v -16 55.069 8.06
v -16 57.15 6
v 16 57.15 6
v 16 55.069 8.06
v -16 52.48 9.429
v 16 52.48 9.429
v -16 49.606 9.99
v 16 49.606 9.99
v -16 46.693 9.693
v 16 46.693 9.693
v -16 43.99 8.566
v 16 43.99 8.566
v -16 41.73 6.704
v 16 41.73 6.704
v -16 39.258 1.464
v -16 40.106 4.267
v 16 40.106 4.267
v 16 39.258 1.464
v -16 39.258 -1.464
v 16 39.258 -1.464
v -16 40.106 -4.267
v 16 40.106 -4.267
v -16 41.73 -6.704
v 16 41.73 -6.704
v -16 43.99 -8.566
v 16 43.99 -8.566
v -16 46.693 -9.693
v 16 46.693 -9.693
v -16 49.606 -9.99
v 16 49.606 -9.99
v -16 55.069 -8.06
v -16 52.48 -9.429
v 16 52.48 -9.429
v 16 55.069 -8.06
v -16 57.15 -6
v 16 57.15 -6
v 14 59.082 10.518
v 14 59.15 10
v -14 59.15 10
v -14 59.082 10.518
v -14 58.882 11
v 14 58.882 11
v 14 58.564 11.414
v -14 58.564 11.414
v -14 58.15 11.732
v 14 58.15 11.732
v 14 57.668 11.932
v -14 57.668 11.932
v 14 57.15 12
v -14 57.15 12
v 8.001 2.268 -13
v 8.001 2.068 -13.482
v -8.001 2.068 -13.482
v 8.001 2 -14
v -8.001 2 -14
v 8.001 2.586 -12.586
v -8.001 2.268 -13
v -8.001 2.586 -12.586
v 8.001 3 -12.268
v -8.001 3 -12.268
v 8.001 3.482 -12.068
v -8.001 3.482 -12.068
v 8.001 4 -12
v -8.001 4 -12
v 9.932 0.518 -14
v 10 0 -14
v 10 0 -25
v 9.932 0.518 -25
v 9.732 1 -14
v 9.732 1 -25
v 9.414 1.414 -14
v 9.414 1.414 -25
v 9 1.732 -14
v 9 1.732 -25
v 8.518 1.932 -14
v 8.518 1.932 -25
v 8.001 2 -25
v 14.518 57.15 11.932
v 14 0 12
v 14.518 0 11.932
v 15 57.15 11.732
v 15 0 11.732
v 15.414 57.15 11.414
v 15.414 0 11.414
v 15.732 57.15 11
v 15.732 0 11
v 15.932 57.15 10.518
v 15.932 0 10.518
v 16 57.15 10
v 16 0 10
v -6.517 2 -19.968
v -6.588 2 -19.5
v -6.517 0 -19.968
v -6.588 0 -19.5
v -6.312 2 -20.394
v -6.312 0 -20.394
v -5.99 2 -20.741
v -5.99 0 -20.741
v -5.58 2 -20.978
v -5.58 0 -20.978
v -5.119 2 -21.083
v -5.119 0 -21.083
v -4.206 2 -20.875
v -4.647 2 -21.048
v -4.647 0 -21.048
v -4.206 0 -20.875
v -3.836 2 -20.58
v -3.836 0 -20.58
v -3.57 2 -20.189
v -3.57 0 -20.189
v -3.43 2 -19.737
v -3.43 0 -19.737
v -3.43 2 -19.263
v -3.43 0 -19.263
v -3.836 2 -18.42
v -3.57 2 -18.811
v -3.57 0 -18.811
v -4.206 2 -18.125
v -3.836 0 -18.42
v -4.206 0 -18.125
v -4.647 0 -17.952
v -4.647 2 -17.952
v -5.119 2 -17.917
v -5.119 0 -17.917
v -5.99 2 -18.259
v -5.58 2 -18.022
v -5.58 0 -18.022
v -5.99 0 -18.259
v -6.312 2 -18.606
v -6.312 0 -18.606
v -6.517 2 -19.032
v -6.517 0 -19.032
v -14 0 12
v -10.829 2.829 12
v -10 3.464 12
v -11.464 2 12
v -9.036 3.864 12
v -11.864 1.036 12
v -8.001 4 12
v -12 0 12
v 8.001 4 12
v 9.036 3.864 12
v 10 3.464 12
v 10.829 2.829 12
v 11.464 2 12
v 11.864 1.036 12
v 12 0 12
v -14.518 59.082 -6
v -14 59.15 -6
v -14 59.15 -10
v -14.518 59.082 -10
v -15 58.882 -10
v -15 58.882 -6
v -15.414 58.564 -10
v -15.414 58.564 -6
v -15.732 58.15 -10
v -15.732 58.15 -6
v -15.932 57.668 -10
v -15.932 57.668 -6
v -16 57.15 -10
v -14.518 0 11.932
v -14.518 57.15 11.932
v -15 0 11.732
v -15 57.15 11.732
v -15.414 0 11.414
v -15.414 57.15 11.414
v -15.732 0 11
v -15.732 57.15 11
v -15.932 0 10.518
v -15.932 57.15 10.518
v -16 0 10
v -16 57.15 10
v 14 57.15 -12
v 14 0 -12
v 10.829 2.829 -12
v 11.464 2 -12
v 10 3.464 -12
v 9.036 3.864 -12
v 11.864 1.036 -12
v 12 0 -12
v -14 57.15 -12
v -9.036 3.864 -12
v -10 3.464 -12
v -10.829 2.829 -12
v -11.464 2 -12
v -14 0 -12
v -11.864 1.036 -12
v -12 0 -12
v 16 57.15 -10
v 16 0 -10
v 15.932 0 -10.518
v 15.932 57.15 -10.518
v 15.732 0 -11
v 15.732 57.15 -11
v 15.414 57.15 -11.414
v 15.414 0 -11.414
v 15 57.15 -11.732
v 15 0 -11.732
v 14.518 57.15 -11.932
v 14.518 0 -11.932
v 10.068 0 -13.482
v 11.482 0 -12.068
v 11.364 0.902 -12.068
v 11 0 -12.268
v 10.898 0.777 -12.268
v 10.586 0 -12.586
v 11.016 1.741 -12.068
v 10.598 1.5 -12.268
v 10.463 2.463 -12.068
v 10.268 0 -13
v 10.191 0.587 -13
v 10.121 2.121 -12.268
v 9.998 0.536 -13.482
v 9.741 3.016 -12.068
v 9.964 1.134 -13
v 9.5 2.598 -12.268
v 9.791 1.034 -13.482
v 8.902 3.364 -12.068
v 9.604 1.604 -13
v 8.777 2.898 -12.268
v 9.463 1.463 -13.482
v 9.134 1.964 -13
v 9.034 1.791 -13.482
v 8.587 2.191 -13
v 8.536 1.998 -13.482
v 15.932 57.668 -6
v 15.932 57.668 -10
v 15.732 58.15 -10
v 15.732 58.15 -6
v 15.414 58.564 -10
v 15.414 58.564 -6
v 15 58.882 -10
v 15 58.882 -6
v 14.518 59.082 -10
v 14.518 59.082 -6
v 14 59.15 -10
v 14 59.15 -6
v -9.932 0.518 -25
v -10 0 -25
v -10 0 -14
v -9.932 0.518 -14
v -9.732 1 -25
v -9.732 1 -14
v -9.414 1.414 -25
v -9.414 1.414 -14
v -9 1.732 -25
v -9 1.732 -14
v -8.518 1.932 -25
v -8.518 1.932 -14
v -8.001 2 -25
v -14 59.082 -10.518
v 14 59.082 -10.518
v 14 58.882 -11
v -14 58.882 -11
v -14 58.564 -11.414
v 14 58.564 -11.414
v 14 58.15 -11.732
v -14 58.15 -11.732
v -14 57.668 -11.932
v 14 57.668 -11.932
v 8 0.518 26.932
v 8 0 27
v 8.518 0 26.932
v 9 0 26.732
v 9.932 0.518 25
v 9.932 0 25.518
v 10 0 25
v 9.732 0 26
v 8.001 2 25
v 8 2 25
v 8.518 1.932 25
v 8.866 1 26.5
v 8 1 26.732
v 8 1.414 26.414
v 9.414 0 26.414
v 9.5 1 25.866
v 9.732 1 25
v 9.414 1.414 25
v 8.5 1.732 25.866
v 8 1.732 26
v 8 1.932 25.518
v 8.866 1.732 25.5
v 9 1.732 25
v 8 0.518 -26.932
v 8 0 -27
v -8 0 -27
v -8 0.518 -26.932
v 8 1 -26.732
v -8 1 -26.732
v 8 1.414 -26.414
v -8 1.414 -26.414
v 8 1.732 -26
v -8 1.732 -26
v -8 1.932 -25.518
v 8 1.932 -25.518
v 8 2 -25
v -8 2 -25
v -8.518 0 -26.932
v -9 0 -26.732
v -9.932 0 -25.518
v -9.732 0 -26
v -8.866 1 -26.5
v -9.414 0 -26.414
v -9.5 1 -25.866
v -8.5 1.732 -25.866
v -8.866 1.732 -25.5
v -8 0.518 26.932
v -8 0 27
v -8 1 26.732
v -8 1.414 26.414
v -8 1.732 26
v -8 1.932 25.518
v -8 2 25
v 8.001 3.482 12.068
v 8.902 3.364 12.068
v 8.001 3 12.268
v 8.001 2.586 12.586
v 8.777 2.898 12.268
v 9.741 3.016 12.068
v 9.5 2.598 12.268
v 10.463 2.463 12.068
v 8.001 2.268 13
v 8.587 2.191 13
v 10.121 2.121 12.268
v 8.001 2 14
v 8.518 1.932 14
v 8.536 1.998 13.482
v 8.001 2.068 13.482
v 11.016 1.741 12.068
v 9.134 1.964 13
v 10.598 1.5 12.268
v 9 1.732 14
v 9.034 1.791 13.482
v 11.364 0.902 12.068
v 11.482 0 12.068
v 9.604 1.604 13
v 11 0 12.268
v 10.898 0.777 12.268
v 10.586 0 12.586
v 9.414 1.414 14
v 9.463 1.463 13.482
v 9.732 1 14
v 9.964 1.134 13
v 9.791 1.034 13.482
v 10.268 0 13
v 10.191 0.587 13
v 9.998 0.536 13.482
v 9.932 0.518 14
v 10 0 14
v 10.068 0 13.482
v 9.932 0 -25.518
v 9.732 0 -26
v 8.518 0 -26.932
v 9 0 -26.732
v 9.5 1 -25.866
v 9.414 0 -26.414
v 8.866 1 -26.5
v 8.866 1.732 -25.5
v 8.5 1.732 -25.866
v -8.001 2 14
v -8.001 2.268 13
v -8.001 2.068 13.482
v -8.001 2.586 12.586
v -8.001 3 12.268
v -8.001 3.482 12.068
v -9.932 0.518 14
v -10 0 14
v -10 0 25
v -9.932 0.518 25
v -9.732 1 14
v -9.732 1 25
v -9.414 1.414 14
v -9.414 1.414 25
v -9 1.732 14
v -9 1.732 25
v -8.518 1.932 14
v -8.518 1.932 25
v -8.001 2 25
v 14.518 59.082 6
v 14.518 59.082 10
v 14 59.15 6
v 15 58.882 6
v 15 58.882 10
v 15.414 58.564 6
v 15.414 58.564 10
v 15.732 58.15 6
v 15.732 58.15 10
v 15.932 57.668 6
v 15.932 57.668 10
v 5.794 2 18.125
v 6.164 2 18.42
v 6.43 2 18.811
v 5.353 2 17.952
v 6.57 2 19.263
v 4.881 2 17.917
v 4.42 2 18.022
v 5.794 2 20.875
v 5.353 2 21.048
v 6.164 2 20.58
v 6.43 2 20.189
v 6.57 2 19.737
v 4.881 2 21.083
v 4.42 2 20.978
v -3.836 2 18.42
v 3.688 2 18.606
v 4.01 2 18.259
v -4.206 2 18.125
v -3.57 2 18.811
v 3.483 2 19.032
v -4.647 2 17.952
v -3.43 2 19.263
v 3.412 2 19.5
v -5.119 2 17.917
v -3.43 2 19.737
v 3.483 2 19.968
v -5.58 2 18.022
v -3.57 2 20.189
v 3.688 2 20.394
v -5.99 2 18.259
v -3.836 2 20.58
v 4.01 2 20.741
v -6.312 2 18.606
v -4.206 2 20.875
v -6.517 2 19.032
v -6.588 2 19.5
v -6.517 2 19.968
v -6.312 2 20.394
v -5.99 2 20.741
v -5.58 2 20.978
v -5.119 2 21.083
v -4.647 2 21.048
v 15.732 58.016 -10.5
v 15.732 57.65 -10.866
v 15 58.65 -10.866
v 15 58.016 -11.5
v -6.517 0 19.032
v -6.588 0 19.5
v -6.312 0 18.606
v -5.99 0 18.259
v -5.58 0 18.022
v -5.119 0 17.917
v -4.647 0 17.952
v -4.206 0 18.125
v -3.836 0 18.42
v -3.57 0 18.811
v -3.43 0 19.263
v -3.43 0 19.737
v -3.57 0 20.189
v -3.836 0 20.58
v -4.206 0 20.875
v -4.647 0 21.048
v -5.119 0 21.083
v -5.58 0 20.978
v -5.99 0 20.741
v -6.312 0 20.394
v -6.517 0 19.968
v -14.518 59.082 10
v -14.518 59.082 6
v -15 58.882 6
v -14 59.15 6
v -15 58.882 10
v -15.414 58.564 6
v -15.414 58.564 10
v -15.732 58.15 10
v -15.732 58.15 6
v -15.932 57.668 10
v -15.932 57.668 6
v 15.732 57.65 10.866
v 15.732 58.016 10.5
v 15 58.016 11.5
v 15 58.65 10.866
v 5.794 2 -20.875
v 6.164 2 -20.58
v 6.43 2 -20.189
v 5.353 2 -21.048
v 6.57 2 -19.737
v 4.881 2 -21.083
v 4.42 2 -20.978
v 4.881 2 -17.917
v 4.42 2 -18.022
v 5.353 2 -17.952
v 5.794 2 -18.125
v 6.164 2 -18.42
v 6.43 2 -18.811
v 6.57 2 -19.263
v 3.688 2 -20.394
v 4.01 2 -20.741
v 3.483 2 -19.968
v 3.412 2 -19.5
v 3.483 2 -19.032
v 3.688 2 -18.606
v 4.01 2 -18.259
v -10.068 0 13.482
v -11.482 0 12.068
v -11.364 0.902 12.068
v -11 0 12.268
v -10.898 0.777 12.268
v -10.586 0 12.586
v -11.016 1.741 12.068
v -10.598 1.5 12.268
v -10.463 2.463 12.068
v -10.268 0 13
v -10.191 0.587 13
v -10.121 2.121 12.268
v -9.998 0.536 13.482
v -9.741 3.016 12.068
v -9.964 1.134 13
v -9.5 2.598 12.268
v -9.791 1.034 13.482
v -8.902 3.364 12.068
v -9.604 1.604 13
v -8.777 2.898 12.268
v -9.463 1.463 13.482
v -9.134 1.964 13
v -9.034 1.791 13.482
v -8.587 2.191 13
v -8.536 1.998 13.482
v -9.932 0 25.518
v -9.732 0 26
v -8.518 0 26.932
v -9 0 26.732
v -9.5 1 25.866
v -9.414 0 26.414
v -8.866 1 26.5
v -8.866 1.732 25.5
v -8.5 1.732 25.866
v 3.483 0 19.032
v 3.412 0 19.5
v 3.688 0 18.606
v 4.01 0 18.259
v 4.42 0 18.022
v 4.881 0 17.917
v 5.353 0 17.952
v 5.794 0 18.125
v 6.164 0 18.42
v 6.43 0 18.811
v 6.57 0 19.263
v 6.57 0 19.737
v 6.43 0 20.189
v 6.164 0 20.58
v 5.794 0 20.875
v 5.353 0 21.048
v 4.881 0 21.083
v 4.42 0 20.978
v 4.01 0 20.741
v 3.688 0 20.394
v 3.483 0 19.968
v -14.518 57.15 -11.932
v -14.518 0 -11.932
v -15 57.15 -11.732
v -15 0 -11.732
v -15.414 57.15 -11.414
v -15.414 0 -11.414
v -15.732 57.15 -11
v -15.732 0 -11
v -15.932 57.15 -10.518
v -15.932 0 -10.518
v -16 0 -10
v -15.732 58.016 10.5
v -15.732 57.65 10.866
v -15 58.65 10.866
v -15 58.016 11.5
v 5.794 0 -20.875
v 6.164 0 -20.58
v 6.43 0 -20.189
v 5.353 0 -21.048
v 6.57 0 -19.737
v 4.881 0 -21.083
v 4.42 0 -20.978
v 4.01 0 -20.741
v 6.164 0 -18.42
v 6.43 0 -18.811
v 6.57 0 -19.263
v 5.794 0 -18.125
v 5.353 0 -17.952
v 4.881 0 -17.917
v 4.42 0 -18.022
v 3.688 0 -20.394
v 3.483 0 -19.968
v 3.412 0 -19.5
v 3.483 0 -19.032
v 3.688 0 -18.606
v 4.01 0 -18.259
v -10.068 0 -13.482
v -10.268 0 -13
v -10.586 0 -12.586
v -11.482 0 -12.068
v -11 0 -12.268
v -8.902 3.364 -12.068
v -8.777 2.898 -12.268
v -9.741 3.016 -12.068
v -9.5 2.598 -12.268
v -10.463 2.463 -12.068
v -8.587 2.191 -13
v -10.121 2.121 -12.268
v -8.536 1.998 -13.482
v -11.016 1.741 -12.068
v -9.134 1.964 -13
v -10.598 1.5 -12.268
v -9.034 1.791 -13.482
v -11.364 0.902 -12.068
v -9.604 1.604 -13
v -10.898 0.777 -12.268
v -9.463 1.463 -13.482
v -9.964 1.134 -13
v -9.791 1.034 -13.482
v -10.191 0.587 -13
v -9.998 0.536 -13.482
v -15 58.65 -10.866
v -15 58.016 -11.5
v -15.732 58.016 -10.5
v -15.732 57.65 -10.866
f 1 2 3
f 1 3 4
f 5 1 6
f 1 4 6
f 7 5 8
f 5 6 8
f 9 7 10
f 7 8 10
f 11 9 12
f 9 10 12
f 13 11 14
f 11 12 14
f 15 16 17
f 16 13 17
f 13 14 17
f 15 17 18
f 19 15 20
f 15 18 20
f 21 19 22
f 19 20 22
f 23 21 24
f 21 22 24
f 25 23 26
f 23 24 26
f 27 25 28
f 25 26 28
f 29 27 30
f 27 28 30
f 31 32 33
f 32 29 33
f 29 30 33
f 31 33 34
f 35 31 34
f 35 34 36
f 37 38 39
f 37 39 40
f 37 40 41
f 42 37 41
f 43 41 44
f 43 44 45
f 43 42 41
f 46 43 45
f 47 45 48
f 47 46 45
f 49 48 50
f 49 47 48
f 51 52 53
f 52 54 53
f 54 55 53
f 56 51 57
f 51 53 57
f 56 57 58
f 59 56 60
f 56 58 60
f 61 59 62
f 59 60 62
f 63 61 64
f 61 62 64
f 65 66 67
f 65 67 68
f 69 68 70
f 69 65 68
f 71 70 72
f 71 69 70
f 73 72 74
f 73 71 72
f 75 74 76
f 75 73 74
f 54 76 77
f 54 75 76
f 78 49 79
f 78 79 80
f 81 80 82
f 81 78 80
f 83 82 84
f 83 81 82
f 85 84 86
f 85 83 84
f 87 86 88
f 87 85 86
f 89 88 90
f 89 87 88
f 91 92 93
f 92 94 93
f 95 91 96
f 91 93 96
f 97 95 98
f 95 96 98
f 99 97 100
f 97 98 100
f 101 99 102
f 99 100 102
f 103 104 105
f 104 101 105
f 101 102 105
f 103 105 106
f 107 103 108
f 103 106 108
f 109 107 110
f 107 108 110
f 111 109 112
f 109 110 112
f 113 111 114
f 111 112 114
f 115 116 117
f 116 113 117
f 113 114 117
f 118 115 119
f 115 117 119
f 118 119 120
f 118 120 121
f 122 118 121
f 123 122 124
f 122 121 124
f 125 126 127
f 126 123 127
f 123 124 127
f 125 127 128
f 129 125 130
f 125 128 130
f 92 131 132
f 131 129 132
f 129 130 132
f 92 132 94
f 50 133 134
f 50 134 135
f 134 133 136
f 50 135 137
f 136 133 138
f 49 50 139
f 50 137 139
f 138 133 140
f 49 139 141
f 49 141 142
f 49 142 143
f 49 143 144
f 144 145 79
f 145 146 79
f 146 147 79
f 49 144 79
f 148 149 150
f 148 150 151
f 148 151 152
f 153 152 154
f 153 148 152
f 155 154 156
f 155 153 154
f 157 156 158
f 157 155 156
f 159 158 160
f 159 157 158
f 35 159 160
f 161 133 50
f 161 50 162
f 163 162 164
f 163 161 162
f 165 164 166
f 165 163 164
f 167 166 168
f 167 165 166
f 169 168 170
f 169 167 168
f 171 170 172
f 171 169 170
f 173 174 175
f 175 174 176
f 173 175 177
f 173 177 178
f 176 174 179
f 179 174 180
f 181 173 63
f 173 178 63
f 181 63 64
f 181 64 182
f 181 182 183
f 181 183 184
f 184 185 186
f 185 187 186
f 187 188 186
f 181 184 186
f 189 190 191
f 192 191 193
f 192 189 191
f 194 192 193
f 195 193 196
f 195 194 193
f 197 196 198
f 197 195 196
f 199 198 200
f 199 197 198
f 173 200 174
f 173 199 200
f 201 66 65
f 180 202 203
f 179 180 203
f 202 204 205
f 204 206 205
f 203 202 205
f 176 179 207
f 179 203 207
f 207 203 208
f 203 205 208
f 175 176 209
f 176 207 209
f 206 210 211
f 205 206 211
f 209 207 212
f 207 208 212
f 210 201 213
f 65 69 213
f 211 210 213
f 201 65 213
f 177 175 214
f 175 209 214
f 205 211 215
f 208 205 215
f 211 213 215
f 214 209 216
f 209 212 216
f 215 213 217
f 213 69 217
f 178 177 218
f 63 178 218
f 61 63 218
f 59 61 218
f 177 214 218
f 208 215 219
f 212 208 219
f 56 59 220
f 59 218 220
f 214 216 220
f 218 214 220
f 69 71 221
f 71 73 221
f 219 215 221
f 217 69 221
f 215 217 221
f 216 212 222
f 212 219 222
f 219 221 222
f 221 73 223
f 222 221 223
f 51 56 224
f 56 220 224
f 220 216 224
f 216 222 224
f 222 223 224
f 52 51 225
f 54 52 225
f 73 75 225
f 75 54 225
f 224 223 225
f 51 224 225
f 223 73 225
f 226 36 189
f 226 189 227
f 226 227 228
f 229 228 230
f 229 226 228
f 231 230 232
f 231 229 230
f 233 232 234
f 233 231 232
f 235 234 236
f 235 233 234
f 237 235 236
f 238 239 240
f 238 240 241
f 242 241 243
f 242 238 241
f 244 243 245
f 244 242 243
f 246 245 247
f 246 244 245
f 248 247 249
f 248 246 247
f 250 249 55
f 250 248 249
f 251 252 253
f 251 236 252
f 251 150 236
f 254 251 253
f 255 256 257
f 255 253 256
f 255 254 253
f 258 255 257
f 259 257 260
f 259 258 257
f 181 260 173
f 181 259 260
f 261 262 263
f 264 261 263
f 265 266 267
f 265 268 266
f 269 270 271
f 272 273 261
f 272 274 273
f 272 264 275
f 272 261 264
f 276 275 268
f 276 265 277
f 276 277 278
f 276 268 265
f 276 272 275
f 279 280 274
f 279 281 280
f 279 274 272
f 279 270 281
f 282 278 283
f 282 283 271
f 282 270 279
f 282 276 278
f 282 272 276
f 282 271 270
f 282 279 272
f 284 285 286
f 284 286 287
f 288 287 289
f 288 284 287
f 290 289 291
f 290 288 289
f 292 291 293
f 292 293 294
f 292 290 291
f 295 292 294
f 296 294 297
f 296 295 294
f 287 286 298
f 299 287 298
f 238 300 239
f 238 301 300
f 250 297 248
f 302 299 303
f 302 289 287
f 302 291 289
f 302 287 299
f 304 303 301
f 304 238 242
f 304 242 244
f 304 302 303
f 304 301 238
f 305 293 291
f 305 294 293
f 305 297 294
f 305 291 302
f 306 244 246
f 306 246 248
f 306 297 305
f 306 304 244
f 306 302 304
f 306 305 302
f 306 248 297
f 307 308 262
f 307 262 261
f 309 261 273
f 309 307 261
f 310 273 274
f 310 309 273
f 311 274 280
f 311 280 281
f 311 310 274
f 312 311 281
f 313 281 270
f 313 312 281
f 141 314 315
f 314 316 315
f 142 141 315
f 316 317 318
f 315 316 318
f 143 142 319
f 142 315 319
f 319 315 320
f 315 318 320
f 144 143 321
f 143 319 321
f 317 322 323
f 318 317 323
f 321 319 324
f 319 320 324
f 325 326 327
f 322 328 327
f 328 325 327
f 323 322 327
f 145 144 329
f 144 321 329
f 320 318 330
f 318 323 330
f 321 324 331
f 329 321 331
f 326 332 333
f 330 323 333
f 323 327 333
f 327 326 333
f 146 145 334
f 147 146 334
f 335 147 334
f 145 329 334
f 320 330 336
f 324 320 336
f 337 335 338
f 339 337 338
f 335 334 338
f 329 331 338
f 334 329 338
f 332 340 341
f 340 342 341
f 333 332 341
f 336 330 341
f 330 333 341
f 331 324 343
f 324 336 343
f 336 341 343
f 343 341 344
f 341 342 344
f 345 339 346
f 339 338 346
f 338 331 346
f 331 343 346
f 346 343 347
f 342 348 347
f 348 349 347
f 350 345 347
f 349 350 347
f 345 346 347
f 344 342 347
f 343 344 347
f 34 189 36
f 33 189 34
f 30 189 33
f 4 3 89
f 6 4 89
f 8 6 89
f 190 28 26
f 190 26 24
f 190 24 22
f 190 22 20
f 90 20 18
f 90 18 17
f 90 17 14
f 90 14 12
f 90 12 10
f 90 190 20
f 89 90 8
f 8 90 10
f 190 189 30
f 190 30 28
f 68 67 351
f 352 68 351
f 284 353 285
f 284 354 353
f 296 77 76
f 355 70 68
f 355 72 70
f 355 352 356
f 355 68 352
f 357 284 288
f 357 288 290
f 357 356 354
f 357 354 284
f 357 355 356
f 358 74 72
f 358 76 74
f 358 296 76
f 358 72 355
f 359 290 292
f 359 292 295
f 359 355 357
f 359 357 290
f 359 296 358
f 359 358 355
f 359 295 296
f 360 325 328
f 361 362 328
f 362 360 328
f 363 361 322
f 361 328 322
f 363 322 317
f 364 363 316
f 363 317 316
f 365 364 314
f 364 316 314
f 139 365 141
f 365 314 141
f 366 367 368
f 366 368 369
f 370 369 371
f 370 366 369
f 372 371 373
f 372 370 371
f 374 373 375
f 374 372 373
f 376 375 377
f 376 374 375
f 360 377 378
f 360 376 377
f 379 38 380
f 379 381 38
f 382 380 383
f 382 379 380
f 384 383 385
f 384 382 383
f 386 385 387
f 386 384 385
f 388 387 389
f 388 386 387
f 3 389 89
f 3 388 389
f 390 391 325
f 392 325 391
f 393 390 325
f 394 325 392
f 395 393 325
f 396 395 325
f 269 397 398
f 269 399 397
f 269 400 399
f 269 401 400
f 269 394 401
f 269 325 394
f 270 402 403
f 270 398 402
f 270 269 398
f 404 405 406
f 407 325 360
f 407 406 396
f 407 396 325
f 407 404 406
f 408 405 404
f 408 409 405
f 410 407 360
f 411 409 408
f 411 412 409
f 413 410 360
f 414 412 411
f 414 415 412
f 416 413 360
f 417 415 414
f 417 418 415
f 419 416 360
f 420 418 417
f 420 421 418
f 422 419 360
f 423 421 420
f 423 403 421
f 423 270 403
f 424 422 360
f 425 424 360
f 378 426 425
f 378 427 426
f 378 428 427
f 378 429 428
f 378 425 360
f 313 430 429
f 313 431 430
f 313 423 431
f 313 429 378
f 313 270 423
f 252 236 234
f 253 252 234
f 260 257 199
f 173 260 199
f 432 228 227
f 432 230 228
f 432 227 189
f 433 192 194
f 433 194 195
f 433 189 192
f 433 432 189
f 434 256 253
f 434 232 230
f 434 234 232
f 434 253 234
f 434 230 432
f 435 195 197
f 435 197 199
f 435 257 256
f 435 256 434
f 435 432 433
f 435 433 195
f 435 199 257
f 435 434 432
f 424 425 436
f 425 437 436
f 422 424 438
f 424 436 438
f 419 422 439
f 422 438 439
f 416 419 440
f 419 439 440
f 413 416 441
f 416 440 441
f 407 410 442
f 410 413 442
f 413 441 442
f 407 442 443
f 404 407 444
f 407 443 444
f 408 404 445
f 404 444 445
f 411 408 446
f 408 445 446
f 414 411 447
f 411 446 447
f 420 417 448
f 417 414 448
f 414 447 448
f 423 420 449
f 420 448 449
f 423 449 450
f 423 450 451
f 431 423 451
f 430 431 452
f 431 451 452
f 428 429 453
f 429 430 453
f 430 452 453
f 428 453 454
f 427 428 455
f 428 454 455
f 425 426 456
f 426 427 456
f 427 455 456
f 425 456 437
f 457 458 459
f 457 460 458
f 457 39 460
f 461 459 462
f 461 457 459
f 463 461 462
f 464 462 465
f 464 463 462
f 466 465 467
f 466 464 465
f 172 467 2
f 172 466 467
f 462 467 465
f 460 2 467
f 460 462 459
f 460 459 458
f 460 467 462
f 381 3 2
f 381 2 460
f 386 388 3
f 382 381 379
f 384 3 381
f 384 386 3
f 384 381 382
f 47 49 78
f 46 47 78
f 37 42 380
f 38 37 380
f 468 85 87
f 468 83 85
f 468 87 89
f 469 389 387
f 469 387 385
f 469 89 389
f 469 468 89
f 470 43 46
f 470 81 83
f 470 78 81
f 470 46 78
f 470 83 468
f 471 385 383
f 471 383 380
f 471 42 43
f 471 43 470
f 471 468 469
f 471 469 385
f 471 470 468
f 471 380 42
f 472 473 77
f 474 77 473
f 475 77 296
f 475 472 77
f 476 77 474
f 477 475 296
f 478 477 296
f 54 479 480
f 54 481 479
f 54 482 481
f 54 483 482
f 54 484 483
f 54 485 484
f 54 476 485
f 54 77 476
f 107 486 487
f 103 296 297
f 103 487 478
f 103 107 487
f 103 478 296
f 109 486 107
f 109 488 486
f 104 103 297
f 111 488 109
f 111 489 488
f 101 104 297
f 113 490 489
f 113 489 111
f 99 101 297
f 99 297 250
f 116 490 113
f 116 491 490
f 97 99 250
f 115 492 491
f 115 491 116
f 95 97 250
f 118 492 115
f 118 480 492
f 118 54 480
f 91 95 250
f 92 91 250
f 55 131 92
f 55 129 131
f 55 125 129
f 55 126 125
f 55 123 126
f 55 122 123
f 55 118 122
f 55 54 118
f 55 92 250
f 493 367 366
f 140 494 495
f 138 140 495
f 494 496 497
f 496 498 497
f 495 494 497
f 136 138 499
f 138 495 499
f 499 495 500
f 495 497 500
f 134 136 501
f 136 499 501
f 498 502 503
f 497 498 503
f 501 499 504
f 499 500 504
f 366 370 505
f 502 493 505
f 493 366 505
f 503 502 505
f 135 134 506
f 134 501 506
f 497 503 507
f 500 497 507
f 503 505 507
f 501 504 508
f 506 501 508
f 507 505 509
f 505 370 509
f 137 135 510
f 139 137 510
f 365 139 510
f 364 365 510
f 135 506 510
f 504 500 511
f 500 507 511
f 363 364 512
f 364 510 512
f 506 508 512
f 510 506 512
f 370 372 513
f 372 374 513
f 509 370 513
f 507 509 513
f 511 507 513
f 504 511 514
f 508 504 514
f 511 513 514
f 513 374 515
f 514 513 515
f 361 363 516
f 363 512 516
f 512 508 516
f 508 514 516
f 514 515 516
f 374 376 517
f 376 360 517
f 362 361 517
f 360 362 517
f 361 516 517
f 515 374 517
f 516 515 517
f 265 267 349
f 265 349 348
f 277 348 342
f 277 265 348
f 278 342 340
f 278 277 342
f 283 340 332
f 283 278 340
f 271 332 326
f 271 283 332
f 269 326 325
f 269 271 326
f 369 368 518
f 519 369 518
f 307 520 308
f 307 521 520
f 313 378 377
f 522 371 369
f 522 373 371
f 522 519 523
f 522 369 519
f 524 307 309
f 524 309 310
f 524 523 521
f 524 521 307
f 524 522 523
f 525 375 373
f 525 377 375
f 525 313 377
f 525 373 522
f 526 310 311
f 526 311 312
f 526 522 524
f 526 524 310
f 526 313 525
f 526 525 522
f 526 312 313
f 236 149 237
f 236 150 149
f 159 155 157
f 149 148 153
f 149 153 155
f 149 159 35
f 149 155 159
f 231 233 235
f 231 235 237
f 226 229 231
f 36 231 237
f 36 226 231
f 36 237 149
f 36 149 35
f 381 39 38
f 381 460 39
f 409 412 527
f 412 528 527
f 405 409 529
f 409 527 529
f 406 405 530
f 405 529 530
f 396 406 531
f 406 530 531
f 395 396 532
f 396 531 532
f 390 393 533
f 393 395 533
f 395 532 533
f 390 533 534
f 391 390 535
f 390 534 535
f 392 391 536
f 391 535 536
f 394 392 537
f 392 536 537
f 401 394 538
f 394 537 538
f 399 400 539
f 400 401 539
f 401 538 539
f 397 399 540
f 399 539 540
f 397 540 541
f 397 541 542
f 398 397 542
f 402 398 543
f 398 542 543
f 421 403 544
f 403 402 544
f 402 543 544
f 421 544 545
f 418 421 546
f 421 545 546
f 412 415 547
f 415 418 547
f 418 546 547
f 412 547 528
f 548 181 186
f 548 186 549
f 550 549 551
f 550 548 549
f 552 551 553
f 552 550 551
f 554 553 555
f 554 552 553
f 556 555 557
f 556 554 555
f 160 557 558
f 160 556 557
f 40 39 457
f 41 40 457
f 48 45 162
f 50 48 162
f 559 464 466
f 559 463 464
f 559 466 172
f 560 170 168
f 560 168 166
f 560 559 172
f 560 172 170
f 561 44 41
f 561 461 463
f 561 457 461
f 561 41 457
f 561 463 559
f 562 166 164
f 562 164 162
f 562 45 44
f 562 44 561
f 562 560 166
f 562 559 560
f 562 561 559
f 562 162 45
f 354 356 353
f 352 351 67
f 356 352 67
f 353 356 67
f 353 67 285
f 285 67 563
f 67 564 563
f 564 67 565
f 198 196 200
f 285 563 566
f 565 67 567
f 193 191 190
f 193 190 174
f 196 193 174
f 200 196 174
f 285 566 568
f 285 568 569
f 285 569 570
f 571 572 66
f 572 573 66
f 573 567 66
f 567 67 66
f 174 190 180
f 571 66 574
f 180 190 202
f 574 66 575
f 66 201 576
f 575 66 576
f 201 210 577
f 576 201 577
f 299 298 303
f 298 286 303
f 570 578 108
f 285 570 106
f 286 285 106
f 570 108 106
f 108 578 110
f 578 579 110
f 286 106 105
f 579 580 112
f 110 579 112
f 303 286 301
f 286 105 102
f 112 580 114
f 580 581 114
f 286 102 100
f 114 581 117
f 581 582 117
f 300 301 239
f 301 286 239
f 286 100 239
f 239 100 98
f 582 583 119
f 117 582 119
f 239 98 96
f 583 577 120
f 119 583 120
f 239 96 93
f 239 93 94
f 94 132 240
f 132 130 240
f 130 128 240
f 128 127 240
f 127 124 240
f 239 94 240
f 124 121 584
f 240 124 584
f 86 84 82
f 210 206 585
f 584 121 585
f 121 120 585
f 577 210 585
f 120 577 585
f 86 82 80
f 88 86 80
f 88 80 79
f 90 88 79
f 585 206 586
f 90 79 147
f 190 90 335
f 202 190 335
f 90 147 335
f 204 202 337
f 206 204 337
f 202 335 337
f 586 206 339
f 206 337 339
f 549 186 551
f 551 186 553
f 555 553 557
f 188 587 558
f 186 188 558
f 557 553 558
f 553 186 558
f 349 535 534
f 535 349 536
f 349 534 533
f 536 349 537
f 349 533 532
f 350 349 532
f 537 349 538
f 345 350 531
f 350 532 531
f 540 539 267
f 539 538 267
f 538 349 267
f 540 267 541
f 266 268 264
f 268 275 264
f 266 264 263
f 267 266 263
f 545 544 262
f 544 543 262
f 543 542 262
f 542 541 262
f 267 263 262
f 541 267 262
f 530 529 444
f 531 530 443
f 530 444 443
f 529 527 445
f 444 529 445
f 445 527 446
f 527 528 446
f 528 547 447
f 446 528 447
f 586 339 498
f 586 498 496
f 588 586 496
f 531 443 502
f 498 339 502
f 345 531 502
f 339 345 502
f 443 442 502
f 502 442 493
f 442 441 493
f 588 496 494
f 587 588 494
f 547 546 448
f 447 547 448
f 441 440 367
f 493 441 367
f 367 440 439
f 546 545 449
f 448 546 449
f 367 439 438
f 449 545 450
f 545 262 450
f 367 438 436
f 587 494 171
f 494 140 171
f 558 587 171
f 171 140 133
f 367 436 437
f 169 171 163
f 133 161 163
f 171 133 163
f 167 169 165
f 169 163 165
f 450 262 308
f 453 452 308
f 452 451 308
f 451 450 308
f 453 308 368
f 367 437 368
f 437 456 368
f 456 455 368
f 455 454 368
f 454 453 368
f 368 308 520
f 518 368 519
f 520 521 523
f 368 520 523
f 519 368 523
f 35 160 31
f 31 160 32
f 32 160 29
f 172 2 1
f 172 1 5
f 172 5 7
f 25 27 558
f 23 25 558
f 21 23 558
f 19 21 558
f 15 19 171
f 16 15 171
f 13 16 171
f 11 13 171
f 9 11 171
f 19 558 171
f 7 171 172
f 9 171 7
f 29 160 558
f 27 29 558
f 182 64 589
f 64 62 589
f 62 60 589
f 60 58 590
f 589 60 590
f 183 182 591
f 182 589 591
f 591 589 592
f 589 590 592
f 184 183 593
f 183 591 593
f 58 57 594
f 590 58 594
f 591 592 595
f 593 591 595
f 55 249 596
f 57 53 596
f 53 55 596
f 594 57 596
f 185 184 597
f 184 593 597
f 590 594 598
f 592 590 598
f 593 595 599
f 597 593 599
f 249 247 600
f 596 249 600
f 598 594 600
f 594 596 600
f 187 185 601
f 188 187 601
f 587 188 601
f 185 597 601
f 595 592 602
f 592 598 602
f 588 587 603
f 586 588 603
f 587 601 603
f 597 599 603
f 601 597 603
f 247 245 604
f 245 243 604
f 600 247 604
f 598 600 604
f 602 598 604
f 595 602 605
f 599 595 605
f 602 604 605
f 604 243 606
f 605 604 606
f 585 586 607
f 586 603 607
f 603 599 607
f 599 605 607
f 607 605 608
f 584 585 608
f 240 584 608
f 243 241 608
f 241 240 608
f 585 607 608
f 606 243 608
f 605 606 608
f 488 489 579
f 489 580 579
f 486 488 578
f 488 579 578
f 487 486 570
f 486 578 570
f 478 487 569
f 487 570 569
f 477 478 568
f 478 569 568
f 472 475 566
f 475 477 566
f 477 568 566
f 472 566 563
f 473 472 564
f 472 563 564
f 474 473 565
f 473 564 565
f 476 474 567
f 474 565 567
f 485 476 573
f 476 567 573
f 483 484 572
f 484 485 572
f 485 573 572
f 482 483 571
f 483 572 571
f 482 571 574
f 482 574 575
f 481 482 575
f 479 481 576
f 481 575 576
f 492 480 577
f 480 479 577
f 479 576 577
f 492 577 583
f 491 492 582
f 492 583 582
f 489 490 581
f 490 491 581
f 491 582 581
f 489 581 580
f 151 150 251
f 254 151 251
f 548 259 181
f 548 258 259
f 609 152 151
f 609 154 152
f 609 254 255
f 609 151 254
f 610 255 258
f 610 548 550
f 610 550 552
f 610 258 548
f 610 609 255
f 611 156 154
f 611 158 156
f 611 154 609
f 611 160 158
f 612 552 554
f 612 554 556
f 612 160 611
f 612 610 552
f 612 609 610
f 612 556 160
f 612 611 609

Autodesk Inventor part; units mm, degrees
ref_plane "YZ Plane" through (0, 0, 0) normal (1, 0, 0) x (0, 1, 0)
ref_plane "XZ Plane" through (0, 0, 0) normal (0, 1, 0) x (-1, 0, 0)
ref_plane "XY Plane" through (0, 0, 0) normal (0, 0, 1) x (1, 0, 0)
sketch "Sketch1" plane through (0, 0, 0) normal (0, 1, 0) x (-1, 0, 0)
  line L0 (16, -12) -> (-16, -12)
  line L1 (-16, -12) -> (-16, 12)
  line L2 (-16, 12) -> (16, 12)
  line L3 (16, 12) -> (16, -12)
  line L4 (16, -12) -> (-16, 12) construction
  line L5 (-16, -12) -> (16, 12) construction
  line L6 (-10, 27) -> (10, 27)
  line L7 (10, 27) -> (10, -27)
  line L8 (10, -27) -> (-10, -27)
  line L9 (-10, -27) -> (-10, 27)
  line L10 (-10, 27) -> (10, -27) construction
  line L11 (10, 27) -> (-10, -27) construction
  circle A0 centre (5, 19.5) radius 1.5875
  circle A1 centre (5, -19.5) radius 1.5875
  circle A2 centre (-5, 19.5) radius 1.5875
  circle A3 centre (-5, -19.5) radius 1.5875
  point P0 (0, 0)
  dimension "d0" = 32
  dimension "d1" = 24
  dimension "d2" = 20
  dimension "d3" = 54
  dimension "d4" = 3.175
  dimension "d5" = 7.5
  dimension "d7" = 5
  dimension "d10" = 39
  dimension "d13" = 10
extrude "Extrusion1" add sketch "Sketch1" along normal blind 2
sketch "Sketch2" plane through (0, 2, 0) normal (0, 1, 0) x (1, 0, 0)
  line L0 (16, 12) -> (16, -12) projected
  line L1 (-16, -12) -> (16, -12)
  line L2 (16, -12) -> (16, 12)
  line L3 (16, 12) -> (-16, 12)
  line L4 (-16, 12) -> (-16, -12)
  line L5 (-16, -12) -> (16, 12) construction
  line L6 (16, -12) -> (-16, 12) construction
  point P0 (0, 0)
extrude "Extrusion2" add sketch "Sketch2" along normal blind 57.15
sketch "Sketch3" plane through (16, 0, 12) normal (1, 0, 0) x (0, 0, -1)
  line L0 (0, 59.15) -> (24, 59.15) projected
  line L1 (24, 0) -> (0, 0) projected
  line L2 (24, 0) -> (24, 59.15) projected
  line L3 (0, 59.15) -> (24, 59.15) projected
  line L4 (0, 0) -> (0, 59.15) projected
  circle A0 centre (12, 49.15) radius 10
  point P0 (12, 0)
  dimension "d20" = 20
  dimension "d21" = 10
extrude "Extrusion3" cut sketch "Sketch3" against normal through all contours A0
sketch "Sketch4" plane through (16, 0, 12) normal (1, 0, 0) x (0, 0, -1)
  circle A0 centre (12, 49.15) radius 10 projected
  line L0 (0, 59.15) -> (12, 59.15) projected
  line L1 (12, 59.15) -> (24, 59.15) projected
  line L2 (12, 59.15) -> (0, 59.15) projected
  line L3 (6, 59.15) -> (18, 59.15)
  line L4 (18, 59.15) -> (18, 57.15)
  line L5 (18, 57.15) -> (6, 57.15)
  line L6 (6, 57.15) -> (6, 59.15)
  point P0 (12, 0)
extrude "Extrusion4" cut sketch "Sketch4" against normal through all contours L5 A0 | A0 L1 L4 | L6 L0 A0 picked at (10.6135, 57.5146)
fillet "Fillet1" radius 2 1 edges at (0, 59.15, 12)
fillet "Fillet2" radius 2 1 edges at (0, 59.15, -12)
fillet "Fillet3" radius 2 3 edges at (16, 58.5642, 11.4142) (16, 59.15, 8) (16, 28.575, 12)
fillet "Fillet4" radius 2 3 edges at (16, 58.5642, -11.4142) (16, 59.15, -8) (16, 28.575, -12)
fillet "Fillet5" radius 2 1 edges at (10, 1, 27)
fillet "Fillet6" radius 2 1 edges at (10, 1, -27)
fillet "Fillet7" radius 2 1 edges at (-10, 1, 27)
fillet "Fillet8" radius 2 1 edges at (-10, 1, -27)
fillet "Fillet9" radius 2 3 edges at (-16, 28.575, -12) (-16, 58.5642, -11.4142) (-16, 59.15, -8)
fillet "Fillet10" radius 2 3 edges at (-16, 28.575, 12) (-16, 58.5642, 11.4142) (-16, 59.15, 8)
fillet "Fillet11" radius 2 5 edges at (10, 2, 18.5) (9.4142, 2, 26.4142) (0, 2, 27) (-9.4142, 2, 26.4142) (-10, 2, 18.5)
fillet "Fillet12" radius 2 3 edges at (0, 2, 12) (-9.4144, 1.4144, 12) (9.4144, 1.4144, 12)
fillet "Fillet13" radius 2 5 edges at (0, 2, -27) (-9.4142, 2, -26.4142) (-10, 2, -18.5) (9.4142, 2, -26.4142) (10, 2, -18.5)
fillet "Fillet14" radius 2 3 edges at (0, 2, -12) (9.4144, 1.4144, -12) (-9.4144, 1.4144, -12)
